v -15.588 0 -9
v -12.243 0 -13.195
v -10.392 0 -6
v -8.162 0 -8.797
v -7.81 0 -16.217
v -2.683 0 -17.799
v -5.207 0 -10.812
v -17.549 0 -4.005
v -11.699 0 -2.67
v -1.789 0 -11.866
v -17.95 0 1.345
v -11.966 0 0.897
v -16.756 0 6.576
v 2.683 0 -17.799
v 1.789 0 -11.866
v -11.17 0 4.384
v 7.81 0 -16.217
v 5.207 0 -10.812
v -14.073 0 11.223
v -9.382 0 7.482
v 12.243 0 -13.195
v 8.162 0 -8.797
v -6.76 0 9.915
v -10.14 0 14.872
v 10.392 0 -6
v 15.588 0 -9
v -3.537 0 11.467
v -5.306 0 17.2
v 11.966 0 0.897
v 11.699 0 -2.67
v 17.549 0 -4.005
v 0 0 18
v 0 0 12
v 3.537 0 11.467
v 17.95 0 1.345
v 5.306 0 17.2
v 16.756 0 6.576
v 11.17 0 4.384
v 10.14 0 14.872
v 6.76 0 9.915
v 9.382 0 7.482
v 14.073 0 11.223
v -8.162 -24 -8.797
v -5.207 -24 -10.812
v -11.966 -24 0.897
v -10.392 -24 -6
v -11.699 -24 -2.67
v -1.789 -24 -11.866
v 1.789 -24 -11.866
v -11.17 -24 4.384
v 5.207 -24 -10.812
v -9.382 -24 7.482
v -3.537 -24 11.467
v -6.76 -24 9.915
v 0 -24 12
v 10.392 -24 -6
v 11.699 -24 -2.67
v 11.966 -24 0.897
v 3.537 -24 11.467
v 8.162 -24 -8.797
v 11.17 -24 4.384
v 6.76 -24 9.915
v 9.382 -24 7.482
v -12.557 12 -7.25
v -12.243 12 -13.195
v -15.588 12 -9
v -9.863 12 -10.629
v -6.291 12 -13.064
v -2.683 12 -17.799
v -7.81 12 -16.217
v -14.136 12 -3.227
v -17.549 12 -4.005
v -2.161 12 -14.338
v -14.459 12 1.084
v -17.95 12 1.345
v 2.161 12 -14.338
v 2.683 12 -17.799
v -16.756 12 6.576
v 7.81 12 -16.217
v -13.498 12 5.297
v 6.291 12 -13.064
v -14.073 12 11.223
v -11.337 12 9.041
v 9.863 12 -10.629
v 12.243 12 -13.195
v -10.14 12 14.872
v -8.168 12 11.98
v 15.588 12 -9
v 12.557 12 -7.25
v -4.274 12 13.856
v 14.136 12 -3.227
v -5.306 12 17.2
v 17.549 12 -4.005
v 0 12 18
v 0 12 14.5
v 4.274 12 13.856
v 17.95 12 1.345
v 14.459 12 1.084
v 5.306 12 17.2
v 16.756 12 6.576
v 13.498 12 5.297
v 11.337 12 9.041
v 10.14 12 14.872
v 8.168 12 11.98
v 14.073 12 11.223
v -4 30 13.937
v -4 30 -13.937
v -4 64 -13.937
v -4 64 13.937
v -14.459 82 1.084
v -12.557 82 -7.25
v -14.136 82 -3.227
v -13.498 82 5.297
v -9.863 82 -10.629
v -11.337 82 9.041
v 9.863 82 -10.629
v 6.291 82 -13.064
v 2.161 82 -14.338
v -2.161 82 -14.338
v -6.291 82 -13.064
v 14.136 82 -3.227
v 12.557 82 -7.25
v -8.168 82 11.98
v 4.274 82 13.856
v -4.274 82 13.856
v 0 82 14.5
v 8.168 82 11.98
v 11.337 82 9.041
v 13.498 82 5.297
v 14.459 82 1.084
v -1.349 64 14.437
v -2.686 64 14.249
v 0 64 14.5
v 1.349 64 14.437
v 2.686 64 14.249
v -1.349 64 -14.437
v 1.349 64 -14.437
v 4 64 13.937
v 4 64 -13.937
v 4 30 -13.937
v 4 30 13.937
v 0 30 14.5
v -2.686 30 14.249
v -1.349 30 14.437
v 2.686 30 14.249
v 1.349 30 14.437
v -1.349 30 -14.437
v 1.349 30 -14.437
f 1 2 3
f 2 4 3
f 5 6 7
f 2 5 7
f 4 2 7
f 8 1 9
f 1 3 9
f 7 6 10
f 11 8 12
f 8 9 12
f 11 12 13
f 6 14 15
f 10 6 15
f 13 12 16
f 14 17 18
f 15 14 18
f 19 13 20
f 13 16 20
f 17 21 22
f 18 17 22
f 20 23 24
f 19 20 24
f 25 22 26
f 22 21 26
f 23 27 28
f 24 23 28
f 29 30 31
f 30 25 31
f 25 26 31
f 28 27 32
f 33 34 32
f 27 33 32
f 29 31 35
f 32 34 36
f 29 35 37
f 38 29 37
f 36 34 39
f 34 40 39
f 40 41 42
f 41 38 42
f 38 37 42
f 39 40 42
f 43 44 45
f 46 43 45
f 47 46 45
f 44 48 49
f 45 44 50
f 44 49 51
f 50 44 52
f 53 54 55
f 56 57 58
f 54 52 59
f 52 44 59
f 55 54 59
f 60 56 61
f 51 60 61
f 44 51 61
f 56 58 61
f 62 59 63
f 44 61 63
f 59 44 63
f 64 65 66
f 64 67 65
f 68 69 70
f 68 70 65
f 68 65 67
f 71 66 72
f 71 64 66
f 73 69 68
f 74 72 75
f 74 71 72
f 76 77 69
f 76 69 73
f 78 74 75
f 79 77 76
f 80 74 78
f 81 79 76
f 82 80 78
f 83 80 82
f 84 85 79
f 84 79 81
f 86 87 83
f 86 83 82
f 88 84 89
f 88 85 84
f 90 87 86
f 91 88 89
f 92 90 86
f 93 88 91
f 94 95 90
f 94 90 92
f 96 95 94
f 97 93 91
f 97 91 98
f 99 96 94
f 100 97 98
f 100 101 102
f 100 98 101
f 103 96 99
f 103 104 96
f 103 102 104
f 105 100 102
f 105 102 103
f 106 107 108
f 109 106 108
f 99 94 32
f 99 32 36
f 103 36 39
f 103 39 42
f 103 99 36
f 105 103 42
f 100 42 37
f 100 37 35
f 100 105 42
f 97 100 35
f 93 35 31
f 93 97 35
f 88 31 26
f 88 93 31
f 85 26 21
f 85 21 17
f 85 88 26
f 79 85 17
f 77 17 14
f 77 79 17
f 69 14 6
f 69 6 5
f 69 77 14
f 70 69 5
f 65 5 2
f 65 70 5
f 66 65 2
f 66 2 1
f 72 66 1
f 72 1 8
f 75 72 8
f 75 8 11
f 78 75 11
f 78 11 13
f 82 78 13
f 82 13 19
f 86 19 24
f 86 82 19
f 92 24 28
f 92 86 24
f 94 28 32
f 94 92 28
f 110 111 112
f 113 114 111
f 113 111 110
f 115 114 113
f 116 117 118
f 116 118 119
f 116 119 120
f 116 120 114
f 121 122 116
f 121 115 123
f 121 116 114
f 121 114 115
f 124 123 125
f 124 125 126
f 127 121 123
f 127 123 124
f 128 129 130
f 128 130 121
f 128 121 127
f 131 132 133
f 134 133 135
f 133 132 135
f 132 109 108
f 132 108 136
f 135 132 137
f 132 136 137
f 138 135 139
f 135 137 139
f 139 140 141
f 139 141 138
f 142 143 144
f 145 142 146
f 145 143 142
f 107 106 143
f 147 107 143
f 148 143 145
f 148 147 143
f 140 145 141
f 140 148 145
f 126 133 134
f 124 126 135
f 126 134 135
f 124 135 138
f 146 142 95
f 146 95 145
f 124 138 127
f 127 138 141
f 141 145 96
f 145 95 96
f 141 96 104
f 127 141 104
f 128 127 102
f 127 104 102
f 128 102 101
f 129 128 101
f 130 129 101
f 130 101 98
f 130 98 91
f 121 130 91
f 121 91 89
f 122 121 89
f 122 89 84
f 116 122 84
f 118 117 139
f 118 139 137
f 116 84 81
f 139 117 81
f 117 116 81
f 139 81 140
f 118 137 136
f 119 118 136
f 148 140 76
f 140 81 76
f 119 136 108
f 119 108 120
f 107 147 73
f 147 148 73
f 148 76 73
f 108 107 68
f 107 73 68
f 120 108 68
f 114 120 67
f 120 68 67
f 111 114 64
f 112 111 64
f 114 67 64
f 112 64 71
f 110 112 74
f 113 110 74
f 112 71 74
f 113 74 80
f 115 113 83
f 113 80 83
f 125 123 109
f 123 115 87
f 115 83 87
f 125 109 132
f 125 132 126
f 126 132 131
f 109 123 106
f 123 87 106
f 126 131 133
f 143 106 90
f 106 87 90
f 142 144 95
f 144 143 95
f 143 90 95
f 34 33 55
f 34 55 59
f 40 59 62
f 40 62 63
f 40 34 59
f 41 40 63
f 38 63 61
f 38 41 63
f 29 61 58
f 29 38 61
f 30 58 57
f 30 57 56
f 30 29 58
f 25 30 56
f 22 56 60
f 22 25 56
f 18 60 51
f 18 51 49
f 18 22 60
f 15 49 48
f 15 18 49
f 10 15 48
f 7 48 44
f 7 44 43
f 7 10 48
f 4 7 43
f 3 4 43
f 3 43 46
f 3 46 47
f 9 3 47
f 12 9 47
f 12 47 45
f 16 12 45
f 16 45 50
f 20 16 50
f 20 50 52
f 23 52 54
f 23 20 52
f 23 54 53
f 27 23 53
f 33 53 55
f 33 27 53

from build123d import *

# Parameters (mm, degrees)
SKETCH1_R               = 12
BOSS_EXTRUDE1_DEPTH     = 24
BOSS_EXTRUDE2_START     = 12
SKETCH1_4_R             = 18
SKETCH1_4_R_2           = 14.5
SKETCH1_4_R_3           = 12
BOSS_EXTRUDE2_DEPTH     = 12
BOSS_EXTRUDE4_START     = 12
SKETCH1_8_R             = 14.5
BOSS_EXTRUDE4_DEPTH     = 70
CUT_EXTRUDE1_DEPTH      = 86.860351735
CUT_EXTRUDE1_DEPTH_BACK = 86.860351735
SKETCH2_W               = 8
SKETCH2_H               = 34


with BuildPart() as part:
    # Sketch1 → Boss-Extrude1 (new body)
    with BuildSketch(Plane(origin=(0, 0, 0), x_dir=(1, 0, 0), z_dir=(0, 1, 0))):
        with Locations(Location((0, 0, 0), (0, 0, 270))):
            Circle(SKETCH1_R)
    extrude(amount=-BOSS_EXTRUDE1_DEPTH)

    # Sketch1<4> → Boss-Extrude2 (add)
    # profile 1 of 3: a face of its own
    with BuildSketch(Plane(origin=(0, 0, 0), x_dir=(1, 0, 0), z_dir=(0, 1, 0)).offset(BOSS_EXTRUDE2_START)):
        with Locations(Location((0, 0, 0), (0, 0, 270))):
            Circle(SKETCH1_4_R)
        Circle(SKETCH1_4_R_2, mode=Mode.SUBTRACT)
    # profile 2 of 3: a face of its own
    with BuildSketch(Plane(origin=(0, 0, 0), x_dir=(1, 0, 0), z_dir=(0, 1, 0)).offset(BOSS_EXTRUDE2_START)):
        Circle(SKETCH1_4_R_2)
        with Locations(Location((0, 0, 0), (0, 0, 270))):
            Circle(SKETCH1_4_R_3, mode=Mode.SUBTRACT)
    # profile 3 of 3: a face of its own
    with BuildSketch(Plane(origin=(0, 0, 0), x_dir=(1, 0, 0), z_dir=(0, 1, 0)).offset(BOSS_EXTRUDE2_START)):
        with Locations(Location((0, 0, 0), (0, 0, 270))):
            Circle(SKETCH1_4_R_3)
    extrude(amount=-BOSS_EXTRUDE2_DEPTH)

    # Sketch1<8> → Boss-Extrude4 (add)
    with BuildSketch(Plane(origin=(0, 0, 0), x_dir=(1, 0, 0), z_dir=(0, 1, 0)).offset(BOSS_EXTRUDE4_START)):
        with Locations(Location((0, 0, 0), (0, 0, 270))):
            Circle(SKETCH1_8_R)
    extrude(amount=BOSS_EXTRUDE4_DEPTH)

    # Sketch2 → Cut-Extrude1 (cut, two sides: drawn at the far end of the back side and taken through both)
    with BuildSketch(Plane.XY.offset(-CUT_EXTRUDE1_DEPTH_BACK)):
        with Locations((0, 47)):
            Rectangle(SKETCH2_W, SKETCH2_H)
    extrude(amount=CUT_EXTRUDE1_DEPTH + CUT_EXTRUDE1_DEPTH_BACK, mode=Mode.SUBTRACT)


solid = part.part
